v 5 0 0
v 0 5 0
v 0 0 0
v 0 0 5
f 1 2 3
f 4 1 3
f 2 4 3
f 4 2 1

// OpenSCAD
// all faces wound the wrong way
polyhedron(points = [[0, 0, 0], [5, 0, 0], [0, 5, 0], [0, 0, 5]],
           faces = [[0, 2, 1], [0, 1, 3], [0, 3, 2], [1, 2, 3]]);
